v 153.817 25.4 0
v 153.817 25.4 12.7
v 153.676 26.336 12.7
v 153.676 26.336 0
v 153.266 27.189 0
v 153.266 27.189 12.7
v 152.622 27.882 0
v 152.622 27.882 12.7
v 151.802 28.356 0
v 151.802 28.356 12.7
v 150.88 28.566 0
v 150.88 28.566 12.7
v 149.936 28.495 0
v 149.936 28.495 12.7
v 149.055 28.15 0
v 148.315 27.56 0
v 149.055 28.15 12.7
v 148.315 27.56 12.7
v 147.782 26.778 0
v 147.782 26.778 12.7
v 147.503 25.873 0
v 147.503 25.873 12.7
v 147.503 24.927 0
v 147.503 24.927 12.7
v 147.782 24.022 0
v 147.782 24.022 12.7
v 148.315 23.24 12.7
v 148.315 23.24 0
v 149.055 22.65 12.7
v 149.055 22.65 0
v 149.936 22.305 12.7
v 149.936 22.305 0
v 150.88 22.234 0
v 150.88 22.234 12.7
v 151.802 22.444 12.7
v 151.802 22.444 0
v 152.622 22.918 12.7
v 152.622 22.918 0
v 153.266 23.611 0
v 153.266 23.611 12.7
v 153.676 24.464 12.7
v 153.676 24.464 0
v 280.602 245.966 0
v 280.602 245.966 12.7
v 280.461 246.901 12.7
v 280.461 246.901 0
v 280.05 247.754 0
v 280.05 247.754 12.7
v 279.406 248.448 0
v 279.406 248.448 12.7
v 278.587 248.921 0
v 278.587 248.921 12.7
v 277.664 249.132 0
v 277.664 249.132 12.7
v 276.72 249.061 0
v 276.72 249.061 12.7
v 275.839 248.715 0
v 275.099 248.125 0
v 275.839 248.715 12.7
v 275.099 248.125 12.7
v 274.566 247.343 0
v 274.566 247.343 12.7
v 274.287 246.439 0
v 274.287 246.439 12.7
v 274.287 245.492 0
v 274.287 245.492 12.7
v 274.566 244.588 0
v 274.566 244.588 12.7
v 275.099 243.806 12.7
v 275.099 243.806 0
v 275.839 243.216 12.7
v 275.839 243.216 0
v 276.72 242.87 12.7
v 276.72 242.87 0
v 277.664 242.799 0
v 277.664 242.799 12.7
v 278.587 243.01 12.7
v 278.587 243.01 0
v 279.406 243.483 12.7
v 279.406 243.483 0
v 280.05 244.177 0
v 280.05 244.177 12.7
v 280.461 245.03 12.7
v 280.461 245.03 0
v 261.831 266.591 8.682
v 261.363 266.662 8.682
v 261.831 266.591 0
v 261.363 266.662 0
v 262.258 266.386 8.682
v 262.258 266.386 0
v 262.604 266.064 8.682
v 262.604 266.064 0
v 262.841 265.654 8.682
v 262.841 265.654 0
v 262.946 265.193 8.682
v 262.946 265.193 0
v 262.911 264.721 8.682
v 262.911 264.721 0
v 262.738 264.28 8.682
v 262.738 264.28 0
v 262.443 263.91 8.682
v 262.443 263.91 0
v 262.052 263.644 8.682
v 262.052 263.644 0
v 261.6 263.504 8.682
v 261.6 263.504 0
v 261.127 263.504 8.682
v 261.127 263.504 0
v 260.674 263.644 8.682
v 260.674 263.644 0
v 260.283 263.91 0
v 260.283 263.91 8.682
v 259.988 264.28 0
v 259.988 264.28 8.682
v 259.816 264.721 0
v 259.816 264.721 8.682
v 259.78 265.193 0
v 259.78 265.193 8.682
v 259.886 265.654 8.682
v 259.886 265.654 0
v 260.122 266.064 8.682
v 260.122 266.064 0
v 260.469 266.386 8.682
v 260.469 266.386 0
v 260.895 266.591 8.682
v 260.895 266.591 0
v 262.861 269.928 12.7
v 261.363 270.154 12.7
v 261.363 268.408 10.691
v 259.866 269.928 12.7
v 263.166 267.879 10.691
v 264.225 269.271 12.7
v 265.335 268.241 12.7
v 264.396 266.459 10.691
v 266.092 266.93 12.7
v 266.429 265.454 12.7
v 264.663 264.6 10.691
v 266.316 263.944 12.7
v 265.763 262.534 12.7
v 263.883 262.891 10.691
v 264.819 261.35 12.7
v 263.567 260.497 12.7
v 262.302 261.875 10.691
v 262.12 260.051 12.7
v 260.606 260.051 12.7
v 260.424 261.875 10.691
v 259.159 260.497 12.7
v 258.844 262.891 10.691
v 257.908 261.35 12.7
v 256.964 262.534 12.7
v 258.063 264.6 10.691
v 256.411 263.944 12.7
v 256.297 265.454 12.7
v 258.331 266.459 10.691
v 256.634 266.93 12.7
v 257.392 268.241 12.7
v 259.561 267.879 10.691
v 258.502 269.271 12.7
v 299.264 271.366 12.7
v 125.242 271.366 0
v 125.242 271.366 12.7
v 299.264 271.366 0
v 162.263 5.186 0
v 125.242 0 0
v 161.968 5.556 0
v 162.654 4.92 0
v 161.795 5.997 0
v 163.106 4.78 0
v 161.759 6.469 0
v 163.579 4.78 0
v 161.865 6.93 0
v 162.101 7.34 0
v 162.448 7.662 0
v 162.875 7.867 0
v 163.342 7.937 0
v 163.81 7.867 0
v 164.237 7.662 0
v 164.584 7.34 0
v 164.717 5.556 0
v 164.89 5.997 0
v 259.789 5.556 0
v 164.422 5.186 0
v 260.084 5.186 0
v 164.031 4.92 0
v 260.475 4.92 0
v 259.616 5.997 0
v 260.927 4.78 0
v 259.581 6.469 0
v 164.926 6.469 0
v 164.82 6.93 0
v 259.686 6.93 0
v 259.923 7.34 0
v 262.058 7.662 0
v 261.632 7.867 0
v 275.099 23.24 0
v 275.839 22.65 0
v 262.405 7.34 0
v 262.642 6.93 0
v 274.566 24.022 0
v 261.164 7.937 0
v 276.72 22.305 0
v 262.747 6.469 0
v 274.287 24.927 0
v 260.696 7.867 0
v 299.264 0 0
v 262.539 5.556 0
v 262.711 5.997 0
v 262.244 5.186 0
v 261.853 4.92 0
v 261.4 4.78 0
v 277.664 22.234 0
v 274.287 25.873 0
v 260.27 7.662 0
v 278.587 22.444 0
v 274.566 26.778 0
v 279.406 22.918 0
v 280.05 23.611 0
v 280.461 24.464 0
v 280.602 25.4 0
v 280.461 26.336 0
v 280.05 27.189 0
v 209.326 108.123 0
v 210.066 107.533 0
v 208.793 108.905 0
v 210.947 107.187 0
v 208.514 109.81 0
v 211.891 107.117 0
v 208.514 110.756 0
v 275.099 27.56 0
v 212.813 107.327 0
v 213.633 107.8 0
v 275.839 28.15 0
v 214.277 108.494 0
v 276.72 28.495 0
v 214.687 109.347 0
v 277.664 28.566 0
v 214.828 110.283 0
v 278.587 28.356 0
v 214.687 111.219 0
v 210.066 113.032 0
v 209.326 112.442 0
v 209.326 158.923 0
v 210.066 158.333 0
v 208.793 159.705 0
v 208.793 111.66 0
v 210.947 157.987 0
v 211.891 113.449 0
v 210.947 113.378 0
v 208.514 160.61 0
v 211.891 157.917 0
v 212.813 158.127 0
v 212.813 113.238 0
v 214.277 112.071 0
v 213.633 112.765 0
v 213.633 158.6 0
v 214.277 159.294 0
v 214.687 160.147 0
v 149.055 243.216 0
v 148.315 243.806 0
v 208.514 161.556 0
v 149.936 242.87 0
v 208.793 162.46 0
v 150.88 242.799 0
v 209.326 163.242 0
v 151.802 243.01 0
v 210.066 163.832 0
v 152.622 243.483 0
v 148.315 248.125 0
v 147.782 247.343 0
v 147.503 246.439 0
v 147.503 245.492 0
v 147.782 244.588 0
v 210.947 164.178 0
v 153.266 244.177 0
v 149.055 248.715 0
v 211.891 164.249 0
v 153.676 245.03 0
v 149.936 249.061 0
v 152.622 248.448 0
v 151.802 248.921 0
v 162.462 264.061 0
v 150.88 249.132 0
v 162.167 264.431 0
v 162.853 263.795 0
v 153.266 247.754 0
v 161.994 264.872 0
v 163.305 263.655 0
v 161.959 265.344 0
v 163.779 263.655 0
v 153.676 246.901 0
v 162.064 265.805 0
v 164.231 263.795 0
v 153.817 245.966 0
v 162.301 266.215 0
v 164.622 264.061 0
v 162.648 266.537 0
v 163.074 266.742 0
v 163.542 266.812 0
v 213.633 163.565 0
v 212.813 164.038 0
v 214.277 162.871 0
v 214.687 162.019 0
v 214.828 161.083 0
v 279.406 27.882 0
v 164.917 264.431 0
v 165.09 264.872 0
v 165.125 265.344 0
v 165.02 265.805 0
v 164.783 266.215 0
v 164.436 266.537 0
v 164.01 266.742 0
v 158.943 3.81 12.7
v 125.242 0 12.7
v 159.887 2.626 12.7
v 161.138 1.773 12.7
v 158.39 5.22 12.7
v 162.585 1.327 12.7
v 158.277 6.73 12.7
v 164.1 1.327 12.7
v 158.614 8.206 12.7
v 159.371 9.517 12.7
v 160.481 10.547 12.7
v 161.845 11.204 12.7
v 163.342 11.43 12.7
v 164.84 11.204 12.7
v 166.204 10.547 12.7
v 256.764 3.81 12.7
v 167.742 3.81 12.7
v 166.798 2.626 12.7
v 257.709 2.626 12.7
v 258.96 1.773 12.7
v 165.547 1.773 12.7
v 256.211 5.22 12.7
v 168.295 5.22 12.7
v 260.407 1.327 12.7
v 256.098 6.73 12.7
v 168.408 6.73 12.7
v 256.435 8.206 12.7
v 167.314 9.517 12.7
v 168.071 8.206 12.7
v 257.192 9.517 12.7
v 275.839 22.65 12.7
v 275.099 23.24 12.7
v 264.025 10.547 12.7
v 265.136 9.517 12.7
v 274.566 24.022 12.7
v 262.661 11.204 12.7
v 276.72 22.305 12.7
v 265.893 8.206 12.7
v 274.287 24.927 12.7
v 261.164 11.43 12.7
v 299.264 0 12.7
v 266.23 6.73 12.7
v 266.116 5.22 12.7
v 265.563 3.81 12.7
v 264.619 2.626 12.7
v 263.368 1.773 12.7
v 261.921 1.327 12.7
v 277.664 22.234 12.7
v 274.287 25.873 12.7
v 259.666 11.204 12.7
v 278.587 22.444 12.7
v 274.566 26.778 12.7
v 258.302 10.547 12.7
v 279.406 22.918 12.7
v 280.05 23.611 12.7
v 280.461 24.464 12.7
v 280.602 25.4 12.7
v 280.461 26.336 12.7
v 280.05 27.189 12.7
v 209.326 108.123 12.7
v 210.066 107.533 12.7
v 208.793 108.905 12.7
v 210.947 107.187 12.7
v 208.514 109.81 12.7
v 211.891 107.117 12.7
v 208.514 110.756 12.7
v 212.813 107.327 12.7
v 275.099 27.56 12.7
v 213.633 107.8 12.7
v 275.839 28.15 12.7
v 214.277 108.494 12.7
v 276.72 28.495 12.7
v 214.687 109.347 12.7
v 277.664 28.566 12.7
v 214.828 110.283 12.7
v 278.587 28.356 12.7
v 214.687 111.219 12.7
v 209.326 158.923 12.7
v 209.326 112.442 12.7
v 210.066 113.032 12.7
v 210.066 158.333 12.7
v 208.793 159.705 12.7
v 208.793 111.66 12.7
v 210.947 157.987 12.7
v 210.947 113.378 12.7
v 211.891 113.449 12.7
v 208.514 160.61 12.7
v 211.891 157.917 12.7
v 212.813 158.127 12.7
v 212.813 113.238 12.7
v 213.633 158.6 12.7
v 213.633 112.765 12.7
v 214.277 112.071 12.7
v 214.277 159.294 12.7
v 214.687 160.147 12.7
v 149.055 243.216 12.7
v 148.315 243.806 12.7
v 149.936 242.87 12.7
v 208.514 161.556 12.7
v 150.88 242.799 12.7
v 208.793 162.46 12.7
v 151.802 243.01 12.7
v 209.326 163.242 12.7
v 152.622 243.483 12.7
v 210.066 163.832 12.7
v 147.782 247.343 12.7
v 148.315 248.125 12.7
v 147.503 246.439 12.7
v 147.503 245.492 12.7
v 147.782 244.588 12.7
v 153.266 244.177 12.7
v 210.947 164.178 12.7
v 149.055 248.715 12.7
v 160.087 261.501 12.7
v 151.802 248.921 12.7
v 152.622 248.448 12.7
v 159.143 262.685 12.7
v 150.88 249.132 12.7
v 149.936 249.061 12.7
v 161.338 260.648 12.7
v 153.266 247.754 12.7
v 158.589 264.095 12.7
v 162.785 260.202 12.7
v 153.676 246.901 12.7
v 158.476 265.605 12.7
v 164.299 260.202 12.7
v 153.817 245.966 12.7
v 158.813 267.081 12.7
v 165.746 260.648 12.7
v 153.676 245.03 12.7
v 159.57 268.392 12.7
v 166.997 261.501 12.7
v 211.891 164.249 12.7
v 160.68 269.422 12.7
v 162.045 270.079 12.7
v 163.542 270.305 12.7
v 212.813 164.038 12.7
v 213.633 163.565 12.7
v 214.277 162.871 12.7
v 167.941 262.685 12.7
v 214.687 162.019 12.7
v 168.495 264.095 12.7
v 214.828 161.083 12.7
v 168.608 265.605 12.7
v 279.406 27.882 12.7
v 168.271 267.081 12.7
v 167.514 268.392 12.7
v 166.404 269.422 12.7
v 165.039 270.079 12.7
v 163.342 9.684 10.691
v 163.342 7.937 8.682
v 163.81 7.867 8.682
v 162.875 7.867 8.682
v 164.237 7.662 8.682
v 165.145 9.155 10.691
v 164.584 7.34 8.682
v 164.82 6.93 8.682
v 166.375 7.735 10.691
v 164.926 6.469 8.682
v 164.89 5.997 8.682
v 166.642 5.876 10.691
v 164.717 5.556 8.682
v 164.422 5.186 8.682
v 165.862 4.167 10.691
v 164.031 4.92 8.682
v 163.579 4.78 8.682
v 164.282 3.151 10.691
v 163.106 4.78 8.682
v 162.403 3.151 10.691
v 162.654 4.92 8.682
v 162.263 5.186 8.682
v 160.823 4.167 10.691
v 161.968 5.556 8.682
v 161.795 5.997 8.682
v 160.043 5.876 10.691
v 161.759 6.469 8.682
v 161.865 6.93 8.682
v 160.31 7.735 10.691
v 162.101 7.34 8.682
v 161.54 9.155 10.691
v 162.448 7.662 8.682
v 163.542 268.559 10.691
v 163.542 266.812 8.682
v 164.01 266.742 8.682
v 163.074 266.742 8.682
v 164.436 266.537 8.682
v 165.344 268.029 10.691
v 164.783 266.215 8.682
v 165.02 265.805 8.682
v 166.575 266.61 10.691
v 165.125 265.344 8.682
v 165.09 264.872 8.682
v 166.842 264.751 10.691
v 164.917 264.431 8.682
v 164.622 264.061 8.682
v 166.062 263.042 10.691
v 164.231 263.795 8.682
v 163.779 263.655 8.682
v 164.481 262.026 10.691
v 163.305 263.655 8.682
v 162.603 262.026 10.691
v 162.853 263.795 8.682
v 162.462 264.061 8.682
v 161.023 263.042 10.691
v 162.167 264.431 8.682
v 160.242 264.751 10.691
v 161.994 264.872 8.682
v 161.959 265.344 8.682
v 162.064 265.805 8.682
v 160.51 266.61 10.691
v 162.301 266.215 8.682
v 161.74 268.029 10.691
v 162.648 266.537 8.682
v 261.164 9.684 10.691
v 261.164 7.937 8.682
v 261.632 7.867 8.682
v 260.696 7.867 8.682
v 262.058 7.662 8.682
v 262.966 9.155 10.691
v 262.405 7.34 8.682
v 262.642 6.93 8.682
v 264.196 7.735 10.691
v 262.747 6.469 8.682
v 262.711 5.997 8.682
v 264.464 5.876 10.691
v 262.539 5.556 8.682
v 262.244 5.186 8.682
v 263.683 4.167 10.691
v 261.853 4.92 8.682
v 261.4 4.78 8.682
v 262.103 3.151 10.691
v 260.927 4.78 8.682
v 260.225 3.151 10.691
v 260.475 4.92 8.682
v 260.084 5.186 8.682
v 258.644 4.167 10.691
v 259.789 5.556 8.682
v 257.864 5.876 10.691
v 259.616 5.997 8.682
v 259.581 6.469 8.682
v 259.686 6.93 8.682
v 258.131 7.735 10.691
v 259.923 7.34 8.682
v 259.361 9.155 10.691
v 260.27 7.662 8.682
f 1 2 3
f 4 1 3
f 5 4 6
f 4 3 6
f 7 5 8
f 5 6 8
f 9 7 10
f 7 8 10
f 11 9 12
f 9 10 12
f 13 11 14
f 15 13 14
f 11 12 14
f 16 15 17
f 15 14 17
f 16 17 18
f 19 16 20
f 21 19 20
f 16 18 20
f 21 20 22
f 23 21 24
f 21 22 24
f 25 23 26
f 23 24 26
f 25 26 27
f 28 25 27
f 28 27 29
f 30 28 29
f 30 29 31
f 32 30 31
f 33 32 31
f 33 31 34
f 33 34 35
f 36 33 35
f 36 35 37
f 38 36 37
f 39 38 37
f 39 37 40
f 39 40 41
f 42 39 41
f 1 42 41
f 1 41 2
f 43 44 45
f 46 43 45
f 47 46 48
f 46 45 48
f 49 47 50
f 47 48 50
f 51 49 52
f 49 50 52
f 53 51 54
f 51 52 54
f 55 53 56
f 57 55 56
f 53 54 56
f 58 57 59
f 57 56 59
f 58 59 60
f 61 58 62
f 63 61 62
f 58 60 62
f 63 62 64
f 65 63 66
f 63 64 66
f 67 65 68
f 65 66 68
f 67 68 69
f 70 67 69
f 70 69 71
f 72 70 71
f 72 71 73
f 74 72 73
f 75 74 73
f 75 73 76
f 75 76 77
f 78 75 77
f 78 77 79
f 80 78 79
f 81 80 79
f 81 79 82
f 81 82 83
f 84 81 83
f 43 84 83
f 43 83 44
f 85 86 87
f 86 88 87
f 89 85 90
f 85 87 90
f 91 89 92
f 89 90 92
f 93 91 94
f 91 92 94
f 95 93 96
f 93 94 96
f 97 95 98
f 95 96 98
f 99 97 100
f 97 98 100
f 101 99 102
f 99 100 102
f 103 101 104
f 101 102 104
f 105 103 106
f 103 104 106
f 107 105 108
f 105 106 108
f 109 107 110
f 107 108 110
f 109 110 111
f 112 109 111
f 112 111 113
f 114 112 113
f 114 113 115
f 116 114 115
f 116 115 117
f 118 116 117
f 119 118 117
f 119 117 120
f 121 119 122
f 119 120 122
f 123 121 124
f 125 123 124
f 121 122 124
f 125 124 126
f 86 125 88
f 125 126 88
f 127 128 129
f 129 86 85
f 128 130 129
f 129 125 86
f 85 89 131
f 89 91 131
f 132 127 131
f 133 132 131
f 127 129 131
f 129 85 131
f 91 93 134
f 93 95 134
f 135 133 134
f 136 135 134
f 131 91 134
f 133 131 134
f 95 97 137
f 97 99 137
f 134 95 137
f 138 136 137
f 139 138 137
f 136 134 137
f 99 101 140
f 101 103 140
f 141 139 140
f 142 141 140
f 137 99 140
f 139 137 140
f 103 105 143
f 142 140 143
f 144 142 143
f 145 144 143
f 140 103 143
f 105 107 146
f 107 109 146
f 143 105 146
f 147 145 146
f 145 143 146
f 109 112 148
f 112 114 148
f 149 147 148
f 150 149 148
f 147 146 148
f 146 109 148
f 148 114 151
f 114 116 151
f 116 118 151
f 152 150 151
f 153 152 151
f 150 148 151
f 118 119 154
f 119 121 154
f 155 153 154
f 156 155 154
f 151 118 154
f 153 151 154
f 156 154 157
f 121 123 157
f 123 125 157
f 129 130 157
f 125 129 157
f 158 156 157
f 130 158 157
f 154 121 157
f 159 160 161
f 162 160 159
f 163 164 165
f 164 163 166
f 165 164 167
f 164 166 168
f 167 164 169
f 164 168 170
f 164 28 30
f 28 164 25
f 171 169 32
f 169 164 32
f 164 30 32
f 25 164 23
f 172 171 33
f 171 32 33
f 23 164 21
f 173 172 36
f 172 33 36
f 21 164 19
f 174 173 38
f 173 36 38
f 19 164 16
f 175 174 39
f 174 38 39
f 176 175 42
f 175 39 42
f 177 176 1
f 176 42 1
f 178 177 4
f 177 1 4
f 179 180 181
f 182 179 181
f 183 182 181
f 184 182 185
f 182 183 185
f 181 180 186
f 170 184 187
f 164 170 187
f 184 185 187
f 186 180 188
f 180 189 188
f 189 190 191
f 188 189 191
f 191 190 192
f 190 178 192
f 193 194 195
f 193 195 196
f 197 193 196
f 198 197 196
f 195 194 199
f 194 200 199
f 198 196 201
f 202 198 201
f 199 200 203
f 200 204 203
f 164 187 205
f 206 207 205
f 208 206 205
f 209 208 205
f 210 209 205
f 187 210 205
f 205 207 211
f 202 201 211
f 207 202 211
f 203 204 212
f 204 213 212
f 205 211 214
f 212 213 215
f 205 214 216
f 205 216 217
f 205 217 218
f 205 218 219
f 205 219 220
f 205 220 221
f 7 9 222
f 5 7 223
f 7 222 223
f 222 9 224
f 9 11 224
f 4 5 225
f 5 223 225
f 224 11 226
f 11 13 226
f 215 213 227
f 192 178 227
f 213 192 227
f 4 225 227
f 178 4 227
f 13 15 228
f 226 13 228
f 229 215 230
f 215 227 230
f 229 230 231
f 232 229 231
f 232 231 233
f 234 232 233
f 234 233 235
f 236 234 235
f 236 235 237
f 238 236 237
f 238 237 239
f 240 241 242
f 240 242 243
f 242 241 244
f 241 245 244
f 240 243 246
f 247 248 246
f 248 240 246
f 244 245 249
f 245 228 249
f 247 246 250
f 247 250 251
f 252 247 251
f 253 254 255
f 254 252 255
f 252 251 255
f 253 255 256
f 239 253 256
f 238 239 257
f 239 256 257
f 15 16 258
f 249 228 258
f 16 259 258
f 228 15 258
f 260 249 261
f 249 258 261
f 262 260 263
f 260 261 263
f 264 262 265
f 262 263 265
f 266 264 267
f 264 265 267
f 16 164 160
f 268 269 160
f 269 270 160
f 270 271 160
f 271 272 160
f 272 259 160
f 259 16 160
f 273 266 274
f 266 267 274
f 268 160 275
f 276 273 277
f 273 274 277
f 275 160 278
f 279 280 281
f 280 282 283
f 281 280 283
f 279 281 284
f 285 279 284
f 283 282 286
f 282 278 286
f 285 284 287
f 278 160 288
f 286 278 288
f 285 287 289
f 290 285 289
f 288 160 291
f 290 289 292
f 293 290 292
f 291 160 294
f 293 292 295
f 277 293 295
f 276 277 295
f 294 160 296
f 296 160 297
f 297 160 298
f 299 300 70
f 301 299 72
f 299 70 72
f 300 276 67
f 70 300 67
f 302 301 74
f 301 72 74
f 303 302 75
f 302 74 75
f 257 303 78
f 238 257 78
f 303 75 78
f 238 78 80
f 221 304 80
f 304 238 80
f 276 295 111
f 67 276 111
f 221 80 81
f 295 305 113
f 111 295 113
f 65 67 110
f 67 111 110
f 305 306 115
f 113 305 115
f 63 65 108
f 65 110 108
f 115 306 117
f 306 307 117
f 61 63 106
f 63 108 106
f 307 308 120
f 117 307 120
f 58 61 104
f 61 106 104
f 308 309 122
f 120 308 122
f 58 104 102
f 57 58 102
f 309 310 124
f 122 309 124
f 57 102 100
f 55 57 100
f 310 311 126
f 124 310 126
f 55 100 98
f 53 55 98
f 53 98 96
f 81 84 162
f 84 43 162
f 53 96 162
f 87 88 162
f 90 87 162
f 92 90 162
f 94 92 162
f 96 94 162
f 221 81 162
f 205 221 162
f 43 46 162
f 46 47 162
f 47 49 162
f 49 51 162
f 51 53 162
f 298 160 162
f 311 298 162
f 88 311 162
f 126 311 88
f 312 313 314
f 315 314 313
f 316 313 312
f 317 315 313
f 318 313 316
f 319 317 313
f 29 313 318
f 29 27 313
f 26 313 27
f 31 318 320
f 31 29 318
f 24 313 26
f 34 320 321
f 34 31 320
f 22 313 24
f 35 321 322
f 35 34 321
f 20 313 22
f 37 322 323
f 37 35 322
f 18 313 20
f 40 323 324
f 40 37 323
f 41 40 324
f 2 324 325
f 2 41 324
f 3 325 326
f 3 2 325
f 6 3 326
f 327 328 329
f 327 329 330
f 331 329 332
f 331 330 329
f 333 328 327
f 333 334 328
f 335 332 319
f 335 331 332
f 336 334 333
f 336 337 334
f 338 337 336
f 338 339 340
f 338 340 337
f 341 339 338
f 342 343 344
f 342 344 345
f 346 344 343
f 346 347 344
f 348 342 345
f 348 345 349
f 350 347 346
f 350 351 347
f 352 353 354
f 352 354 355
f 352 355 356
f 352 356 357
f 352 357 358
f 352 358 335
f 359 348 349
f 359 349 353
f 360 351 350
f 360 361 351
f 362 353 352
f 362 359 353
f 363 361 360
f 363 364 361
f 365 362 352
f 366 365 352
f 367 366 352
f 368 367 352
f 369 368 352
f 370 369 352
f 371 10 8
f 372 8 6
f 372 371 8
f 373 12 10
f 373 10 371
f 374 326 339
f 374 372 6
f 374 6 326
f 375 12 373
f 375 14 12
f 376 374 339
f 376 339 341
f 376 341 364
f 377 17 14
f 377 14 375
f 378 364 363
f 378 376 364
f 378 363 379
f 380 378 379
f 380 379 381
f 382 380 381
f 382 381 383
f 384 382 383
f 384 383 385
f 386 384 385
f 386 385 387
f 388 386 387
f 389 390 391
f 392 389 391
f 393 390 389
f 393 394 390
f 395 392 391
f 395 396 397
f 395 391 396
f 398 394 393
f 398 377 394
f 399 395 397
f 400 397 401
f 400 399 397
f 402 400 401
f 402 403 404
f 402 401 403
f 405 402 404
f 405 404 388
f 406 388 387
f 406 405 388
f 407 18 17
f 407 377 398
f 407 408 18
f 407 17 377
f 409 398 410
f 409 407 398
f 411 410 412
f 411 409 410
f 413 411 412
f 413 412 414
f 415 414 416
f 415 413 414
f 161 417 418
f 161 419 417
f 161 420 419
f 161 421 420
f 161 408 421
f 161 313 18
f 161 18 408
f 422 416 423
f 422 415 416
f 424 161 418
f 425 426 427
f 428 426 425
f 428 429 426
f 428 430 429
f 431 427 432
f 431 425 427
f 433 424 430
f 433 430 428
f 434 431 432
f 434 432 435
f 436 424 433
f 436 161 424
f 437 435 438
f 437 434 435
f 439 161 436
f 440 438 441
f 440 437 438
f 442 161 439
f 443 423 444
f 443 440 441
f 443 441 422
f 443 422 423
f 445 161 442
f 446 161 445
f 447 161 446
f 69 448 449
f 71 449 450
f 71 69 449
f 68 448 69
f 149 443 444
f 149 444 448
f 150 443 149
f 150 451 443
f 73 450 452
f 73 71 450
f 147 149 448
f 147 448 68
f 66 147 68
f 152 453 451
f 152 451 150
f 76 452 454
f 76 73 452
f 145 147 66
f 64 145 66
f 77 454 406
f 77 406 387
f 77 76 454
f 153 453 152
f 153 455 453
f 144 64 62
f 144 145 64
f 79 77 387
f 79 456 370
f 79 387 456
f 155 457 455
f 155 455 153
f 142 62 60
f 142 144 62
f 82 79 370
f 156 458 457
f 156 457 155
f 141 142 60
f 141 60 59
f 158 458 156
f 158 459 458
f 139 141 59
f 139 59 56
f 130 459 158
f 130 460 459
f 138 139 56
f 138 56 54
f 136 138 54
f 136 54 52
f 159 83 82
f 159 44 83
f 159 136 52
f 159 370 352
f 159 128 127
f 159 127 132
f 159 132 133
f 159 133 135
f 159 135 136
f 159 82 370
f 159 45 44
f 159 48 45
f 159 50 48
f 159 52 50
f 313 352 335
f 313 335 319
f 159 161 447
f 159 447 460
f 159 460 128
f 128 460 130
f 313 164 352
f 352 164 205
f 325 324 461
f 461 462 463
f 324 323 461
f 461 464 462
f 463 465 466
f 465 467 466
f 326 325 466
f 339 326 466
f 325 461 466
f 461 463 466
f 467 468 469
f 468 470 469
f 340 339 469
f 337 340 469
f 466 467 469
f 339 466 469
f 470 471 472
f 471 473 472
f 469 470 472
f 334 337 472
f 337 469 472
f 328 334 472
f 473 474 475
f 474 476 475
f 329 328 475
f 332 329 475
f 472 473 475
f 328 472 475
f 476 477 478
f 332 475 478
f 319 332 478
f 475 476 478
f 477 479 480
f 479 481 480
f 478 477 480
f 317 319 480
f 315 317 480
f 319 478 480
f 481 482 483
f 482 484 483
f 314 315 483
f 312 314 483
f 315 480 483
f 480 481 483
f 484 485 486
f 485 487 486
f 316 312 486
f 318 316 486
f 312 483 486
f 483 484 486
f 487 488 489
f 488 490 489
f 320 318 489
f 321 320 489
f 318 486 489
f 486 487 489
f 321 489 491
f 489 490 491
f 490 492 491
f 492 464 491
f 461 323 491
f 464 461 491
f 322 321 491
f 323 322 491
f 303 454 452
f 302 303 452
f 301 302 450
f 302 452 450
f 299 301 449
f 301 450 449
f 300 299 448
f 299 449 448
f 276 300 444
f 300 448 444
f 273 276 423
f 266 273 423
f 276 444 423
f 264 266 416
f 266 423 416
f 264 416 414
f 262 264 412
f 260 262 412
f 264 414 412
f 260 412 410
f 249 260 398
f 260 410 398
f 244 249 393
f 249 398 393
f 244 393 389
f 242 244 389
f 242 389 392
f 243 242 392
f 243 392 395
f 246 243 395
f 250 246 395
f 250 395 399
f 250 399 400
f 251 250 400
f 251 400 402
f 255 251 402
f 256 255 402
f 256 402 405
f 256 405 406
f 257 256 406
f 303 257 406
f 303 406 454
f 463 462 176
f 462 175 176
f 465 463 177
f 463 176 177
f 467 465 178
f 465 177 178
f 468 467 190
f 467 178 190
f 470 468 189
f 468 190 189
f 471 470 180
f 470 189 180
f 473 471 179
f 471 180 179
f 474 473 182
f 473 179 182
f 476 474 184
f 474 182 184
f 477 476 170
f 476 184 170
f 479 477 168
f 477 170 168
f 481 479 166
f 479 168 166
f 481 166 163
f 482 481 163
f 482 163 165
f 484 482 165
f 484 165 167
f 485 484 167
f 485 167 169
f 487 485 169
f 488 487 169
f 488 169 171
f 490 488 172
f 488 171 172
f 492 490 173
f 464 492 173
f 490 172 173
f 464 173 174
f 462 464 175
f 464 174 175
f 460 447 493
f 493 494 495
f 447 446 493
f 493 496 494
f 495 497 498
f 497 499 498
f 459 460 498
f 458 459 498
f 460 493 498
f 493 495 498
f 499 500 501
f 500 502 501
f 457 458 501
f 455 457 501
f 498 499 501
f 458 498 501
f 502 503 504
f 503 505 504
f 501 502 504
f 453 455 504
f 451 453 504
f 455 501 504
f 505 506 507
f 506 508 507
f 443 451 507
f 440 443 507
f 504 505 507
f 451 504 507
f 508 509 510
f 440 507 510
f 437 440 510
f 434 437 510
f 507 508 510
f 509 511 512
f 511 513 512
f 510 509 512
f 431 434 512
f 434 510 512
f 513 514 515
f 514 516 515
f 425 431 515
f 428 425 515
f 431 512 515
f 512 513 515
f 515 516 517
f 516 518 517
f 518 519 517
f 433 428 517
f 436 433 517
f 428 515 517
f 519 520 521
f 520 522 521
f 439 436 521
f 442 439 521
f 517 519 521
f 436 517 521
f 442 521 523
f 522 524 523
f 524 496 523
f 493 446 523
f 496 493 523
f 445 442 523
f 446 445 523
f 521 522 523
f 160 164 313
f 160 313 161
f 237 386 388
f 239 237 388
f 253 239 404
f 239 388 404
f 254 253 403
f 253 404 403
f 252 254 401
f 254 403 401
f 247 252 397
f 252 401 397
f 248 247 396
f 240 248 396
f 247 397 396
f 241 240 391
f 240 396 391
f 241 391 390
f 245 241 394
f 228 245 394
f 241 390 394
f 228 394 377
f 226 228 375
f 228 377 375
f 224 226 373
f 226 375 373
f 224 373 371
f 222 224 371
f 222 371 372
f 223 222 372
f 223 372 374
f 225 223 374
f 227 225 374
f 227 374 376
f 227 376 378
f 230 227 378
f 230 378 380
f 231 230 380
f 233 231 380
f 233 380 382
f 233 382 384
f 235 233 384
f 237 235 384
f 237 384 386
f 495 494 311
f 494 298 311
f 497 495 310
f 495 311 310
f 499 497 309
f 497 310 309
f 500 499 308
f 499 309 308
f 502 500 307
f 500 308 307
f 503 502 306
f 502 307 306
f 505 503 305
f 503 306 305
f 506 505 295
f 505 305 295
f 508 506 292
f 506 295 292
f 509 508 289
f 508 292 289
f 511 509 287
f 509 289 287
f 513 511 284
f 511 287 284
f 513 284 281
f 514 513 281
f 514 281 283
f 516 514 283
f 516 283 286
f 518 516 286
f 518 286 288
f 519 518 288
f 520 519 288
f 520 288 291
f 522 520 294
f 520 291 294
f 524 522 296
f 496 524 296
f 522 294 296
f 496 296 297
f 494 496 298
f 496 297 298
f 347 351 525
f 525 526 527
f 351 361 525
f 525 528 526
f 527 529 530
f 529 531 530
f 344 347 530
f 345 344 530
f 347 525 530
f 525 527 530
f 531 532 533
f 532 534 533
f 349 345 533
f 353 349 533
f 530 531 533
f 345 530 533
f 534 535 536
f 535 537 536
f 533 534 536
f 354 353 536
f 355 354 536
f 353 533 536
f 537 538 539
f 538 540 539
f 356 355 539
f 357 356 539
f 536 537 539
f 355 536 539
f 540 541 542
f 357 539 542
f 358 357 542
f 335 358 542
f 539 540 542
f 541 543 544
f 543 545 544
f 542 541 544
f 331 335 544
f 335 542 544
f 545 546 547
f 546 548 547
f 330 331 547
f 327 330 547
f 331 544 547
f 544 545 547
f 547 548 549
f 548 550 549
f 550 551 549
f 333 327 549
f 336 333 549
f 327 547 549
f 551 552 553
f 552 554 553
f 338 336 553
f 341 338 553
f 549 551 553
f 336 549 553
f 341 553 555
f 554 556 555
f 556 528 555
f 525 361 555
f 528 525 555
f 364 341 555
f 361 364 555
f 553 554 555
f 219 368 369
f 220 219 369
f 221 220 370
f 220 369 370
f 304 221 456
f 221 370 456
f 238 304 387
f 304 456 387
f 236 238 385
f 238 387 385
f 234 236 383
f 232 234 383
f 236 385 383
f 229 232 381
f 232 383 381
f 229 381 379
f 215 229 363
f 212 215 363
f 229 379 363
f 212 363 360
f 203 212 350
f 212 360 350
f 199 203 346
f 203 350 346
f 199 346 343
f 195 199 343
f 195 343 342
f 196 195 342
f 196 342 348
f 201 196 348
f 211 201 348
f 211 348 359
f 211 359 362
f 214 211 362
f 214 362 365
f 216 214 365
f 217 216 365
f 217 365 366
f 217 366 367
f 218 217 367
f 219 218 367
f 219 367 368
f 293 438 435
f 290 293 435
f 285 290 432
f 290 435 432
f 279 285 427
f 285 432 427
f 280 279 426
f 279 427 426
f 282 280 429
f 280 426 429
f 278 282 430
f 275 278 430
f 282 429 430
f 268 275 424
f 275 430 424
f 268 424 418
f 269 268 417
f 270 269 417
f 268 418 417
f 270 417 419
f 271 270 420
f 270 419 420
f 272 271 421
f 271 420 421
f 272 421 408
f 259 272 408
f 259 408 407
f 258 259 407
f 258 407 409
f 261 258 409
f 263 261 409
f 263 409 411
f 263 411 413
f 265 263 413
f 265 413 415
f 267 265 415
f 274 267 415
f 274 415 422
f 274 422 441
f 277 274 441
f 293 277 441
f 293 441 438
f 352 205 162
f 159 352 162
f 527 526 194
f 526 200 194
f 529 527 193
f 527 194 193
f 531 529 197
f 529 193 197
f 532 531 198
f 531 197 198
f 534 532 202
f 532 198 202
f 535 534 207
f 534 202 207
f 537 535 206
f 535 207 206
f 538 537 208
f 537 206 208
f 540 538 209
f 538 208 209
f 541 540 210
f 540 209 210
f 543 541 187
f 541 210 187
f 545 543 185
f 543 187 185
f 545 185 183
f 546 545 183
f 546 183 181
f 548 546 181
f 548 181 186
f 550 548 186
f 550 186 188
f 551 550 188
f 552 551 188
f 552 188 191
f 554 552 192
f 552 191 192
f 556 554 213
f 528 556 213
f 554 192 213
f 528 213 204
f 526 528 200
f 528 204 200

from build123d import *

# Parameters (mm, degrees)
SKETCH1_W                   = 174.021305966
SKETCH1_H                   = 271.365530146
BOSS_EXTRUDE1_DEPTH         = 12.7
F_1_4_0_25_DIAMETER_HOLE1_D = 6.35
HOLE1_D                     = 3.175
HOLE1_DEPTH                 = 31.75
HOLE1_CSINK_D               = 10.16
HOLE1_CSINK_ANGLE           = 82
HOLE1_TIP                   = 0.953866233


with BuildPart() as part:
    # Sketch1 → Boss-Extrude1 (new body)
    with BuildSketch(Plane.XY):
        with Locations((212.253144626, 135.682765073)):
            Rectangle(SKETCH1_W, SKETCH1_H)
    extrude(amount=BOSS_EXTRUDE1_DEPTH)

    # 1/4 (0.25) Diameter Hole1 (through all)
    with Locations(Plane(origin=(0, 0, 0), x_dir=(-1, 0, 0), z_dir=(0, 0, -1))):
        with Locations((-277.426568305, 245.965530146), (-211.653264176, 161.082765073), (-150.642491643, 245.965530146), (-211.653264176, 110.282765073), (-277.426568305, 25.4), (-150.642491643, 25.4)):
            Hole(F_1_4_0_25_DIAMETER_HOLE1_D / 2)

    # Hole1
    with Locations(Plane(origin=(-504.900458932, 135.816741379, 12.7), x_dir=(0, -1, 0), z_dir=(0, 0, 1))):
        with Locations((-129.257383629, 766.263727577), (129.466741379, 668.242950575), (129.466741379, 766.064256541), (-129.408220012, 668.442537903)):
            CounterSinkHole(HOLE1_D / 2, HOLE1_CSINK_D / 2, depth=HOLE1_DEPTH, counter_sink_angle=HOLE1_CSINK_ANGLE)
            with Locations((0, 0, -(HOLE1_DEPTH + HOLE1_TIP / 2))):  # 118° drill point
                Cone(0, HOLE1_D / 2, HOLE1_TIP, mode=Mode.SUBTRACT)


solid = part.part
